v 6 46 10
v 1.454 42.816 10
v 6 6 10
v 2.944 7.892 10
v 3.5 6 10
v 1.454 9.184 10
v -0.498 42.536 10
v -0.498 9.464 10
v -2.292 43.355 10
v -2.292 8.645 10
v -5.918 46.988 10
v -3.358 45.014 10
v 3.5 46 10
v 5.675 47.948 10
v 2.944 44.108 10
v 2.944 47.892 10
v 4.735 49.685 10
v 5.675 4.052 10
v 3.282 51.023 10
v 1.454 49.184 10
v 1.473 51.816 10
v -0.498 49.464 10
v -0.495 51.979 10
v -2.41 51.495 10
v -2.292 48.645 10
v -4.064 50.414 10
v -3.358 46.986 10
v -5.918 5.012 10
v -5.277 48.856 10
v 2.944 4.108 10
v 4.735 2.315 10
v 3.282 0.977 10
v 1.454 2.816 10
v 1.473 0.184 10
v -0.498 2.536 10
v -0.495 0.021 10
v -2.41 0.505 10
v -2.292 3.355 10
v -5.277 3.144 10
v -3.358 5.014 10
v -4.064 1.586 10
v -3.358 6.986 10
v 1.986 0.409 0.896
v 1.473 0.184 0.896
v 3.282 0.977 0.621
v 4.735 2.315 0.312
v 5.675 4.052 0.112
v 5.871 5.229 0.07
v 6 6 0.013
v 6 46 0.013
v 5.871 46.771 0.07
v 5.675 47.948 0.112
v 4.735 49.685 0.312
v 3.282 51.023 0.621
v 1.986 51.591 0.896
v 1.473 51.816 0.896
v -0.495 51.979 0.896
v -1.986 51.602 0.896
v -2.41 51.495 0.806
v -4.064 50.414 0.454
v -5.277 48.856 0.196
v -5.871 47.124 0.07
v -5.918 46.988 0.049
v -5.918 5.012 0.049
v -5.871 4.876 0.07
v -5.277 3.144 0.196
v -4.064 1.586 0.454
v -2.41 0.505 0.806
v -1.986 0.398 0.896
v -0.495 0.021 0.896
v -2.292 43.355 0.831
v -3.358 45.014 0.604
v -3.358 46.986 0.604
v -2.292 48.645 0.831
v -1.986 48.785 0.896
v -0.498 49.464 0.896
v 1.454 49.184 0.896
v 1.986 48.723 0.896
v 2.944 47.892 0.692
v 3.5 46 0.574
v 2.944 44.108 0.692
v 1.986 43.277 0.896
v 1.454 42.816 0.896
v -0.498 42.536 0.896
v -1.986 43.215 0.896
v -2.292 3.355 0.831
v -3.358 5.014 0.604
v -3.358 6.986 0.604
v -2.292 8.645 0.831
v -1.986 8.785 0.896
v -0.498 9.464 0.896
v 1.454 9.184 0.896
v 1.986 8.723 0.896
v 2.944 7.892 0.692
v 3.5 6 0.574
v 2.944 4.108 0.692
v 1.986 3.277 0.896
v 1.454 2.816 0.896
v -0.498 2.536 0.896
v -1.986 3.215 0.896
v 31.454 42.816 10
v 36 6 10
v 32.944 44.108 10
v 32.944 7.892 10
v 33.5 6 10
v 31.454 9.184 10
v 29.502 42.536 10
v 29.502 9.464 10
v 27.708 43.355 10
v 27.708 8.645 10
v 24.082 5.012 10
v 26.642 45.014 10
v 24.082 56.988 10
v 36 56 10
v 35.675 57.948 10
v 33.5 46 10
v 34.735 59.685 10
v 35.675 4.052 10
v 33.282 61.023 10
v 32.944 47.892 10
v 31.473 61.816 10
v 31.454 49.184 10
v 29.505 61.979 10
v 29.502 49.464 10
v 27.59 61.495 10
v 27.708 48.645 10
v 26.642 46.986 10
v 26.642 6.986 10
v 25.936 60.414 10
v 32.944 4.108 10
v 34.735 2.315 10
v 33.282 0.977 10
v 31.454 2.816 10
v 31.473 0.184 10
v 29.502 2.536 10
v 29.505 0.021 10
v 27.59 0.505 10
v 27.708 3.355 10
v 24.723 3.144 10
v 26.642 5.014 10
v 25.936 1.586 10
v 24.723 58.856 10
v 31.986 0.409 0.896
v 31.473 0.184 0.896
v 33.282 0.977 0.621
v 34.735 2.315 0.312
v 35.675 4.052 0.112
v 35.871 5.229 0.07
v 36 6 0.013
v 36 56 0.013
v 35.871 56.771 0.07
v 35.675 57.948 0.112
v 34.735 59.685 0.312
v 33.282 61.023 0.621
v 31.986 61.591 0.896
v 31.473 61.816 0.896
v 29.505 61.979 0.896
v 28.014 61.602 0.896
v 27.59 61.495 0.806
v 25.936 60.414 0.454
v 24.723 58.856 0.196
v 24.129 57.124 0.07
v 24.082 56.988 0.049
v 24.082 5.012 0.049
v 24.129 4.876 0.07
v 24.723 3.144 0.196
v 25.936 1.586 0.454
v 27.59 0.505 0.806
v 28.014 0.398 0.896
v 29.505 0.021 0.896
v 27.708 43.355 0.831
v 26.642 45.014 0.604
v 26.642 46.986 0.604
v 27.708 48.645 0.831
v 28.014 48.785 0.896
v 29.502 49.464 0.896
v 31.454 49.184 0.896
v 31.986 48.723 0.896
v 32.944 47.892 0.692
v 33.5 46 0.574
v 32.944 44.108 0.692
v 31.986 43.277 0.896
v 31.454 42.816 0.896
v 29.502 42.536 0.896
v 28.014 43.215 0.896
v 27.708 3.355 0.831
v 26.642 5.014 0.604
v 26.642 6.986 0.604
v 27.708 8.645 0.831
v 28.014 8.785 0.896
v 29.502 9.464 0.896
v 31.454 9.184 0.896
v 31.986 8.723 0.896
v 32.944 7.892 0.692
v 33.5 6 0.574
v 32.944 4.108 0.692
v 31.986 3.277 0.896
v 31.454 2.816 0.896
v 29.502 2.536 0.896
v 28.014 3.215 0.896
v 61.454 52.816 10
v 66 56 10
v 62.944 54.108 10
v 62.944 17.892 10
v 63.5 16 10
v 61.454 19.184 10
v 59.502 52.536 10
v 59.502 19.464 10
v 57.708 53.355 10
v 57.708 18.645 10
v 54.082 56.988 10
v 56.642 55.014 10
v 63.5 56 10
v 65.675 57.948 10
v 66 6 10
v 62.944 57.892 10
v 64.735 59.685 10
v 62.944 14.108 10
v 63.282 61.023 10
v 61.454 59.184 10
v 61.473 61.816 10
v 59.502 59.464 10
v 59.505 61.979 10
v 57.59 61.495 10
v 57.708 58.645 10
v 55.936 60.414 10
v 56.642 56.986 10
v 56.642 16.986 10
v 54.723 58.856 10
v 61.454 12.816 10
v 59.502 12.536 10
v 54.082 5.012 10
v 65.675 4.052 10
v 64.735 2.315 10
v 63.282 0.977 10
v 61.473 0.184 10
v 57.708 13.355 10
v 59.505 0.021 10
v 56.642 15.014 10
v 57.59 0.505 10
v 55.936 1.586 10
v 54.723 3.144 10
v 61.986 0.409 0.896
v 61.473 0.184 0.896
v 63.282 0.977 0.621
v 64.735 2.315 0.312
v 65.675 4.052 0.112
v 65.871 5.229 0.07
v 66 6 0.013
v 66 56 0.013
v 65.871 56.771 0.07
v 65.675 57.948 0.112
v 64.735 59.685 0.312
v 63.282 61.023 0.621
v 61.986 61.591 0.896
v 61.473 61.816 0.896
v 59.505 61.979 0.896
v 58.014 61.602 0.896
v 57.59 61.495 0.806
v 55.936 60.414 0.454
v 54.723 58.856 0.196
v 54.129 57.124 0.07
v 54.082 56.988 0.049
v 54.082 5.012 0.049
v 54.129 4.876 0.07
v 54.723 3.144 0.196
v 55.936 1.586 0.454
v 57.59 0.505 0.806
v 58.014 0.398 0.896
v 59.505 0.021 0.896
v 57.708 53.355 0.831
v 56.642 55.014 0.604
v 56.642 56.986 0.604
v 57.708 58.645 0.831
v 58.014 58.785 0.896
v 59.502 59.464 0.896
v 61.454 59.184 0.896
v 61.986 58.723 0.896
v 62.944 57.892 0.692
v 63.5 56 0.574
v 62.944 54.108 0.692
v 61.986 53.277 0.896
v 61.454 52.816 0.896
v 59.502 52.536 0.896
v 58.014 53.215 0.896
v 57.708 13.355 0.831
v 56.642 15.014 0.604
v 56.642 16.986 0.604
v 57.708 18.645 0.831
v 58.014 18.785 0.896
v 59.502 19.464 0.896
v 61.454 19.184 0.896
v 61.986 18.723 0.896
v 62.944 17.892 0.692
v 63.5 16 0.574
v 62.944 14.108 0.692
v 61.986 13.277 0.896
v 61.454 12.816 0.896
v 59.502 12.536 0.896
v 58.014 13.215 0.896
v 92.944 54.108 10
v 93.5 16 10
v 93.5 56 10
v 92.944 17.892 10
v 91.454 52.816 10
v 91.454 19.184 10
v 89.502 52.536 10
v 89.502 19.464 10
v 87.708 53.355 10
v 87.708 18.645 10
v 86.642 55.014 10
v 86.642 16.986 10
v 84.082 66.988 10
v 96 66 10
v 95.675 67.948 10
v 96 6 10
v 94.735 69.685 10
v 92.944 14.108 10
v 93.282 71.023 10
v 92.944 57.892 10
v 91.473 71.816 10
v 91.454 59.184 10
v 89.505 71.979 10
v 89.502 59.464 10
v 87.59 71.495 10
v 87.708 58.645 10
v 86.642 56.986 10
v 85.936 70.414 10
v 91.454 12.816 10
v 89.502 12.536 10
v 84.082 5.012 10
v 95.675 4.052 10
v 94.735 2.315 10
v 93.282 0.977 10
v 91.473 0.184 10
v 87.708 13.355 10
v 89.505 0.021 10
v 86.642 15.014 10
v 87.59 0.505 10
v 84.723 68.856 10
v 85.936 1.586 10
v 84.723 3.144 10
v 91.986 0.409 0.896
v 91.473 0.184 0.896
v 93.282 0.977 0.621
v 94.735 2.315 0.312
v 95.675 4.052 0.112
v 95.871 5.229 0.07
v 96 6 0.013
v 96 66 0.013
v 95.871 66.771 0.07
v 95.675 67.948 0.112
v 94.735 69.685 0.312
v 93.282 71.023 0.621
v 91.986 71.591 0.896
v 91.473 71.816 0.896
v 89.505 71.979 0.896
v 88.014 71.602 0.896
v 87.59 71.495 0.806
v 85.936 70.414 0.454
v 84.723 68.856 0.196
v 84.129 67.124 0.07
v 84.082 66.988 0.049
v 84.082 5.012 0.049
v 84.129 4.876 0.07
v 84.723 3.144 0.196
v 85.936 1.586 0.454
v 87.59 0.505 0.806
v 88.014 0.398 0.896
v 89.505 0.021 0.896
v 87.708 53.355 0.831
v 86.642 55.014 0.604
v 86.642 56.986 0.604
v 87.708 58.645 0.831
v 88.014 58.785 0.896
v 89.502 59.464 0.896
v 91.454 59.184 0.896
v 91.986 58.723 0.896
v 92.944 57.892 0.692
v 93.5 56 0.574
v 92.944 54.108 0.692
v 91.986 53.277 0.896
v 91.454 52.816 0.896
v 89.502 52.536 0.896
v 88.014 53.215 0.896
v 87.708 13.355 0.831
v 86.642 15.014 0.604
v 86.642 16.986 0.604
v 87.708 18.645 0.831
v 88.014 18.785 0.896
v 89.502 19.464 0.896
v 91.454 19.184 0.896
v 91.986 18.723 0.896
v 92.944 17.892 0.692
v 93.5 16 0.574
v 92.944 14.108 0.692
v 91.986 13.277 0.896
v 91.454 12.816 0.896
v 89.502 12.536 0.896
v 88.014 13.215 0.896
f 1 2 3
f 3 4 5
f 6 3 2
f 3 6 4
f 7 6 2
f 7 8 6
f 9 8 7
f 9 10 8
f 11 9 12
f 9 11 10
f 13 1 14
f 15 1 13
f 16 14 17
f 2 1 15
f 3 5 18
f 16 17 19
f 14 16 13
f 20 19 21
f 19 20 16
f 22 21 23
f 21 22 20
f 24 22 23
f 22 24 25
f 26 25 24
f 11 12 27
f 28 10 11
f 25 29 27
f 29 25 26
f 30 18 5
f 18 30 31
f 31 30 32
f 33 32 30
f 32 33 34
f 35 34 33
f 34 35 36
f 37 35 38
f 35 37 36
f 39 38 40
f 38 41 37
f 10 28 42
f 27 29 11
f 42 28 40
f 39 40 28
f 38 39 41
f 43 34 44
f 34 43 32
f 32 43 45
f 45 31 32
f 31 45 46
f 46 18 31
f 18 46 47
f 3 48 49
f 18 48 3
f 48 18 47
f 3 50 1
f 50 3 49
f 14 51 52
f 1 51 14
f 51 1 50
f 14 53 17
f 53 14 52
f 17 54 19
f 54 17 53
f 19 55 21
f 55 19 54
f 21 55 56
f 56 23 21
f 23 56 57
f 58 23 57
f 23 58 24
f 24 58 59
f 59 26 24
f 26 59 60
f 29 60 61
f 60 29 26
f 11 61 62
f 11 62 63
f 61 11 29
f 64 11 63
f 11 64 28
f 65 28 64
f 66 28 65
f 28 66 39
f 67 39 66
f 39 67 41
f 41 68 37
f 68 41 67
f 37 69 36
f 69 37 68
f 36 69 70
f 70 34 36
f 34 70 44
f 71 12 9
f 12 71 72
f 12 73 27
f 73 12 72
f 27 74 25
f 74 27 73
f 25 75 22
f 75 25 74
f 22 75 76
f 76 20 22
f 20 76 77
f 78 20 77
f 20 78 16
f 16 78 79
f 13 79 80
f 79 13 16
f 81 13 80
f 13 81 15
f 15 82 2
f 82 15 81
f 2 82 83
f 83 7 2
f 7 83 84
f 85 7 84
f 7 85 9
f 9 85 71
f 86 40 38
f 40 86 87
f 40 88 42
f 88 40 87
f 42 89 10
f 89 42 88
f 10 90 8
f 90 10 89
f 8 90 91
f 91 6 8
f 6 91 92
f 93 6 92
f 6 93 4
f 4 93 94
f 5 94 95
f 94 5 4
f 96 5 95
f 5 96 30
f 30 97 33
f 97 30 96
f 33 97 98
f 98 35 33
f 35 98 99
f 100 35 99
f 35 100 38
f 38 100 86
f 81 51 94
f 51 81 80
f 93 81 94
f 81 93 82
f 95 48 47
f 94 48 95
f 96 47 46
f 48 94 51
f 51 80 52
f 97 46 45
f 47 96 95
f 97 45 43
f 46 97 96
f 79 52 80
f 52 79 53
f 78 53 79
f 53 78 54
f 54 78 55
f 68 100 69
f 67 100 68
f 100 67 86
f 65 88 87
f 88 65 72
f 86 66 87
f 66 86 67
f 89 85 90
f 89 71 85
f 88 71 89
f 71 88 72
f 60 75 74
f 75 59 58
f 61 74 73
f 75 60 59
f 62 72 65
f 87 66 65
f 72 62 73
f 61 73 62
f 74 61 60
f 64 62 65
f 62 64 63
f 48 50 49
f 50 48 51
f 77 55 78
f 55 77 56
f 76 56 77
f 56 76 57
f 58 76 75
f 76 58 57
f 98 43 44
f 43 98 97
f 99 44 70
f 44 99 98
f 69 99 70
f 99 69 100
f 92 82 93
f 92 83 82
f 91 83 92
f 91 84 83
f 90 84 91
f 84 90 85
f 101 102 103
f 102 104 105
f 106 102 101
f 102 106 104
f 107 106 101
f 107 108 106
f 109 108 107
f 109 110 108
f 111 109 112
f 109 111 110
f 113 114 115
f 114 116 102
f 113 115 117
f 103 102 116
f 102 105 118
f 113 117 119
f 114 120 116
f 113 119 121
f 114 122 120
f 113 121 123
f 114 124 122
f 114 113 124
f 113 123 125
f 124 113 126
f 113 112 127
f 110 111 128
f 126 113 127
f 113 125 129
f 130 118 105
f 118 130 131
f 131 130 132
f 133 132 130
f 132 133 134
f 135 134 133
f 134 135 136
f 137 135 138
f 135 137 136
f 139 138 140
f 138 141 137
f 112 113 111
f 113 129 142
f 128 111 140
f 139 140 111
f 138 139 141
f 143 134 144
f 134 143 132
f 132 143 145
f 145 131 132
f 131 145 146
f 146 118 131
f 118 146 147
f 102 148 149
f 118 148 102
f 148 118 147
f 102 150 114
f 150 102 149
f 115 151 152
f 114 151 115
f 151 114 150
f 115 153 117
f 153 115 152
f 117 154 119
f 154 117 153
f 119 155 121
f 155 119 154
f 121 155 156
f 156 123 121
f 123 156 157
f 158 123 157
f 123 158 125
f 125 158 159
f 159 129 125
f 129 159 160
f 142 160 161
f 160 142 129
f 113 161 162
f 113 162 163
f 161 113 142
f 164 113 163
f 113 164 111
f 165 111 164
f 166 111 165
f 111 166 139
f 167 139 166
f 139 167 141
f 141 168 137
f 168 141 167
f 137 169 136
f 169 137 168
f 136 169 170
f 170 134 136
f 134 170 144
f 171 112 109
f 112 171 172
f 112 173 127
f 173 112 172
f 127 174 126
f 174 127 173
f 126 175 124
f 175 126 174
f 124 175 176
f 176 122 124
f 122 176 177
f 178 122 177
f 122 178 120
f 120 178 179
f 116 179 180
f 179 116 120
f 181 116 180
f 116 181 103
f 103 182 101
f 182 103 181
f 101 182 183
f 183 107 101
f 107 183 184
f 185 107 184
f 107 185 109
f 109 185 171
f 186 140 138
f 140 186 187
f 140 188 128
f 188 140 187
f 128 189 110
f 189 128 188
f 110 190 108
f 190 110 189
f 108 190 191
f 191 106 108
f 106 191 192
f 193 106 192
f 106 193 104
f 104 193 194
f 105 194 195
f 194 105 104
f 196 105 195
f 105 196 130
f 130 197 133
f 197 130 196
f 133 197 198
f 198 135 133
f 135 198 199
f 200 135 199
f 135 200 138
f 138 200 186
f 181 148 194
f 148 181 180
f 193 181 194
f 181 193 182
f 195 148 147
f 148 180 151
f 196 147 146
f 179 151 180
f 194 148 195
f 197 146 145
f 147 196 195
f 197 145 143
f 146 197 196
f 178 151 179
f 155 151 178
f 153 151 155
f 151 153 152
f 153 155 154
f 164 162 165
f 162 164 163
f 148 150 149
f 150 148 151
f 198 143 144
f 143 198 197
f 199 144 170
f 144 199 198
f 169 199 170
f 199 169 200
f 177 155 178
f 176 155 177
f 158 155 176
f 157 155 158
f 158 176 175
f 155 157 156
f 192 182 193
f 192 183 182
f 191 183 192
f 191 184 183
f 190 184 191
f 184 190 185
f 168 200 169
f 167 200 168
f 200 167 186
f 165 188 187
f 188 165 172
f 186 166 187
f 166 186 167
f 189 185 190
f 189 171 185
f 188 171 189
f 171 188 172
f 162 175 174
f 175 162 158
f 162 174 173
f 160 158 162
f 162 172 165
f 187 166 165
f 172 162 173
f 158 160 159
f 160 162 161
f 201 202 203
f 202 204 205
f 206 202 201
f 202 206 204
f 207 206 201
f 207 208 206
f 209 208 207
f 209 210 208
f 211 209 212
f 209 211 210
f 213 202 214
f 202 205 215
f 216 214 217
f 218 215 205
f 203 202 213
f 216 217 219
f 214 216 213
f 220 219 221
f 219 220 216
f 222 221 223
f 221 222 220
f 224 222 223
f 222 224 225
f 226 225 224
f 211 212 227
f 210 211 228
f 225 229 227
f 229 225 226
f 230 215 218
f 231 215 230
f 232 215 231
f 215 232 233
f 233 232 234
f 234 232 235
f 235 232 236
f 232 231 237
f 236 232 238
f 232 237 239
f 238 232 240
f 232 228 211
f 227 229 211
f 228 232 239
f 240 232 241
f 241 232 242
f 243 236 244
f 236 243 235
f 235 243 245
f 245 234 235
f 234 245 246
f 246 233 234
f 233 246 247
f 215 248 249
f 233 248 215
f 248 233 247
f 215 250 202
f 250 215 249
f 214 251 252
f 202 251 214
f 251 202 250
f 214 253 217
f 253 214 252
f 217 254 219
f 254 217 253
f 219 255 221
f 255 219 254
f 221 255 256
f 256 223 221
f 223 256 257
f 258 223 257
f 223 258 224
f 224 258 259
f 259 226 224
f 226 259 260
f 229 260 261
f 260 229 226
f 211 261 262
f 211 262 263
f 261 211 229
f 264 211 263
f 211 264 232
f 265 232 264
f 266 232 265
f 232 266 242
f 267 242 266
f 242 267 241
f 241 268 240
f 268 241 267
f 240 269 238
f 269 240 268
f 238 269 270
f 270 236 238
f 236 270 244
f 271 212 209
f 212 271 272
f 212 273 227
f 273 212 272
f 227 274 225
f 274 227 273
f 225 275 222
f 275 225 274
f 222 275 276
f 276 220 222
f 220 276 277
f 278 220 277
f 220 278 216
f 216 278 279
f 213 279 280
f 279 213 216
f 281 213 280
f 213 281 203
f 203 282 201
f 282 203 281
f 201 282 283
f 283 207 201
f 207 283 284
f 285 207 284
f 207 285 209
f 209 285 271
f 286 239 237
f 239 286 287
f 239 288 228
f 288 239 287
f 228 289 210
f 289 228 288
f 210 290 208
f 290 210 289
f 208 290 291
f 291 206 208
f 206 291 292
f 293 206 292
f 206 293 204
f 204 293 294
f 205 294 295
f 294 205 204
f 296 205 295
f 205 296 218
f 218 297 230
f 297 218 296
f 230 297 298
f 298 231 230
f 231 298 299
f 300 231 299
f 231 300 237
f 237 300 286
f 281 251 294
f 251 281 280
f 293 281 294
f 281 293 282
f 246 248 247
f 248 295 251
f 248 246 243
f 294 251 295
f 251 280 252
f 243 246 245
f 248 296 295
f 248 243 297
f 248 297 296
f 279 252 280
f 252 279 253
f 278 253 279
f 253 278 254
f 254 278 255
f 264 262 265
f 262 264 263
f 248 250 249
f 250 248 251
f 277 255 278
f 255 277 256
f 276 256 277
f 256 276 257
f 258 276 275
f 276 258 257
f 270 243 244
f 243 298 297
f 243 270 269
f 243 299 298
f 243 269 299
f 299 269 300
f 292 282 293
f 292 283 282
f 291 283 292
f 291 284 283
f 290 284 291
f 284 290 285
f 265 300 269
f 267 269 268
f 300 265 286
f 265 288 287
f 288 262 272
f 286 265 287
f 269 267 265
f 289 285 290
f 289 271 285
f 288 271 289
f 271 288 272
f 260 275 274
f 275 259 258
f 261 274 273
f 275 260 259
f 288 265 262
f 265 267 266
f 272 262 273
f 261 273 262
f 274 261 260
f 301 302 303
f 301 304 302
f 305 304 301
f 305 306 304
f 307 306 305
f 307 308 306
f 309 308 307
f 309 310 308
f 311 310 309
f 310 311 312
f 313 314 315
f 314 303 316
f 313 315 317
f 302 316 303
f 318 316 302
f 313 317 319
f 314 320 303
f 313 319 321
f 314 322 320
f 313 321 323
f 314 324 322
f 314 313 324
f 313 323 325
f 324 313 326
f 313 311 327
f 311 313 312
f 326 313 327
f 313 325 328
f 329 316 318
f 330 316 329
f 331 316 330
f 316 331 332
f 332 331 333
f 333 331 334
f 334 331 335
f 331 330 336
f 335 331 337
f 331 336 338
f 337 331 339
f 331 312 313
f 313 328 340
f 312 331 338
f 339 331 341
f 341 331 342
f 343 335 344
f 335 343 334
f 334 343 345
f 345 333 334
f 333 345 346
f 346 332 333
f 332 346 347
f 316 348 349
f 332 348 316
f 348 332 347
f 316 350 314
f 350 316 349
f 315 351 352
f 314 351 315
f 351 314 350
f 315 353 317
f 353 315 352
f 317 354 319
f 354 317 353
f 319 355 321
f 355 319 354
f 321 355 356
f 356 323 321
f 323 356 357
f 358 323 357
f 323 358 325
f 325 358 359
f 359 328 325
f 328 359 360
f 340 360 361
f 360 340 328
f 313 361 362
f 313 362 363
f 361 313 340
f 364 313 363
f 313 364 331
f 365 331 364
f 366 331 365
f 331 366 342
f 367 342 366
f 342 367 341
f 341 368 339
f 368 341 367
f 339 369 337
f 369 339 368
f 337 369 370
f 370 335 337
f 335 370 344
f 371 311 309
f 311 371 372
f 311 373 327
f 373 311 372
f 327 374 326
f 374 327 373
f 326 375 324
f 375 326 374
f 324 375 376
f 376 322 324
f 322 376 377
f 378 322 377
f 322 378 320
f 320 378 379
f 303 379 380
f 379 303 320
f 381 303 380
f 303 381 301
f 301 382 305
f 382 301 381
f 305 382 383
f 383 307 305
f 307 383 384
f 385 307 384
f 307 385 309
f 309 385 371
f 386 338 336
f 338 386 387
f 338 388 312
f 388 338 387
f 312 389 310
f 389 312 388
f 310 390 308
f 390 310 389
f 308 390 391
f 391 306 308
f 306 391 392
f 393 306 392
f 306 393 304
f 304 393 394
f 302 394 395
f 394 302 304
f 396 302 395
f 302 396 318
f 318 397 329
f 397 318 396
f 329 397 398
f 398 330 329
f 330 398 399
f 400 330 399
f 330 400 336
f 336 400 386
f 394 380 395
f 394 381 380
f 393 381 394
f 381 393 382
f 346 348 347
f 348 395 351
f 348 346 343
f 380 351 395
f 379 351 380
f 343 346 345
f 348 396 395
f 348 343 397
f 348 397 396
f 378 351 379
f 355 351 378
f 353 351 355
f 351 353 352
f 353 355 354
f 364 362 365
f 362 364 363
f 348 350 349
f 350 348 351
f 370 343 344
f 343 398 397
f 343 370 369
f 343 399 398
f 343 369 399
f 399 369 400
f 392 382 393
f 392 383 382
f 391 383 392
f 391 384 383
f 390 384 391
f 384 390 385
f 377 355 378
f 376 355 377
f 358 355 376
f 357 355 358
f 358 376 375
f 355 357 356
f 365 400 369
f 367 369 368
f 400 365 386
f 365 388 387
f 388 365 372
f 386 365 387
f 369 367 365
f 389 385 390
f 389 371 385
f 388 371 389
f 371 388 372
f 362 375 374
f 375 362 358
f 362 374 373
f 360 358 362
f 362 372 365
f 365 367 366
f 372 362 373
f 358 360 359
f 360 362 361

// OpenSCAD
// Perlegear TV Stand Rollable TV Trolley for 13-50 Inch TVs with 30° Tilt,
// https://www.amazon.de/dp/B0BPG8PY1R
// --------------------------------------------------------

function perlegear_upper_tube_diameter() = 38;
function perlegear_upper_tube_bore_distance() = 40;
function perlegear_upper_tube_bore_diameter() = 7;
function perlegear_screw_mount_tube_carve_depth() = 1;

function perlegear_screw_mount_default_width() = 12;
function perlegear_screw_mount_default_thickness() = 10;

module perlegear_screw_mount_2d_shape(
    w = perlegear_screw_mount_default_width(),
    o = 0, // overhang
    u = 0  // underhang
) {
    d = perlegear_upper_tube_bore_diameter();
    o = o + perlegear_upper_tube_bore_distance();

    difference() {
        hull() {
            translate([0, -u, 0]) circle(d = w);
            translate([0, o, 0]) circle(d = w);
        }
        translate([0, 0, 0]) circle(d = d); // bottom bore
        translate([0, perlegear_upper_tube_bore_distance(), 0]) circle(d = d); // top bore
    }
}

module perlegear_screw_mount_base(
    w = perlegear_screw_mount_default_width(),
    t = perlegear_screw_mount_default_thickness(),
    o = 0, // overhang
    u = 0  // underhang
){
    linear_extrude(t) {
        perlegear_screw_mount_2d_shape(w = w, o = o, u = u);
    }
}

module perlegear_upper_tube(h){
    z = perlegear_screw_mount_tube_carve_depth() - perlegear_upper_tube_diameter() / 2;

    translate([0, 0, z])
        rotate([-90, 0, 0])
            cylinder(h = h, d = perlegear_upper_tube_diameter());
}

module perlegear_screw_mount(
    w = perlegear_screw_mount_default_width(),
    t = perlegear_screw_mount_default_thickness(),
    o = 0, // overhang
    u = 0  // underhang
){
    h = w + perlegear_upper_tube_bore_distance() + u + o;
    y_offset = w / 2 + u;

    difference() {
        translate([0, y_offset, 0])
        perlegear_screw_mount_base(w = w, t = t, o = o, u = u);
        perlegear_upper_tube(h = h);
    }
}

perlegear_screw_mount();
translate([30, 0, 0]) perlegear_screw_mount(o = 10);
translate([60, 0, 0]) perlegear_screw_mount(u = 10);
translate([90, 0, 0]) perlegear_screw_mount(o = 10, u = 10);
